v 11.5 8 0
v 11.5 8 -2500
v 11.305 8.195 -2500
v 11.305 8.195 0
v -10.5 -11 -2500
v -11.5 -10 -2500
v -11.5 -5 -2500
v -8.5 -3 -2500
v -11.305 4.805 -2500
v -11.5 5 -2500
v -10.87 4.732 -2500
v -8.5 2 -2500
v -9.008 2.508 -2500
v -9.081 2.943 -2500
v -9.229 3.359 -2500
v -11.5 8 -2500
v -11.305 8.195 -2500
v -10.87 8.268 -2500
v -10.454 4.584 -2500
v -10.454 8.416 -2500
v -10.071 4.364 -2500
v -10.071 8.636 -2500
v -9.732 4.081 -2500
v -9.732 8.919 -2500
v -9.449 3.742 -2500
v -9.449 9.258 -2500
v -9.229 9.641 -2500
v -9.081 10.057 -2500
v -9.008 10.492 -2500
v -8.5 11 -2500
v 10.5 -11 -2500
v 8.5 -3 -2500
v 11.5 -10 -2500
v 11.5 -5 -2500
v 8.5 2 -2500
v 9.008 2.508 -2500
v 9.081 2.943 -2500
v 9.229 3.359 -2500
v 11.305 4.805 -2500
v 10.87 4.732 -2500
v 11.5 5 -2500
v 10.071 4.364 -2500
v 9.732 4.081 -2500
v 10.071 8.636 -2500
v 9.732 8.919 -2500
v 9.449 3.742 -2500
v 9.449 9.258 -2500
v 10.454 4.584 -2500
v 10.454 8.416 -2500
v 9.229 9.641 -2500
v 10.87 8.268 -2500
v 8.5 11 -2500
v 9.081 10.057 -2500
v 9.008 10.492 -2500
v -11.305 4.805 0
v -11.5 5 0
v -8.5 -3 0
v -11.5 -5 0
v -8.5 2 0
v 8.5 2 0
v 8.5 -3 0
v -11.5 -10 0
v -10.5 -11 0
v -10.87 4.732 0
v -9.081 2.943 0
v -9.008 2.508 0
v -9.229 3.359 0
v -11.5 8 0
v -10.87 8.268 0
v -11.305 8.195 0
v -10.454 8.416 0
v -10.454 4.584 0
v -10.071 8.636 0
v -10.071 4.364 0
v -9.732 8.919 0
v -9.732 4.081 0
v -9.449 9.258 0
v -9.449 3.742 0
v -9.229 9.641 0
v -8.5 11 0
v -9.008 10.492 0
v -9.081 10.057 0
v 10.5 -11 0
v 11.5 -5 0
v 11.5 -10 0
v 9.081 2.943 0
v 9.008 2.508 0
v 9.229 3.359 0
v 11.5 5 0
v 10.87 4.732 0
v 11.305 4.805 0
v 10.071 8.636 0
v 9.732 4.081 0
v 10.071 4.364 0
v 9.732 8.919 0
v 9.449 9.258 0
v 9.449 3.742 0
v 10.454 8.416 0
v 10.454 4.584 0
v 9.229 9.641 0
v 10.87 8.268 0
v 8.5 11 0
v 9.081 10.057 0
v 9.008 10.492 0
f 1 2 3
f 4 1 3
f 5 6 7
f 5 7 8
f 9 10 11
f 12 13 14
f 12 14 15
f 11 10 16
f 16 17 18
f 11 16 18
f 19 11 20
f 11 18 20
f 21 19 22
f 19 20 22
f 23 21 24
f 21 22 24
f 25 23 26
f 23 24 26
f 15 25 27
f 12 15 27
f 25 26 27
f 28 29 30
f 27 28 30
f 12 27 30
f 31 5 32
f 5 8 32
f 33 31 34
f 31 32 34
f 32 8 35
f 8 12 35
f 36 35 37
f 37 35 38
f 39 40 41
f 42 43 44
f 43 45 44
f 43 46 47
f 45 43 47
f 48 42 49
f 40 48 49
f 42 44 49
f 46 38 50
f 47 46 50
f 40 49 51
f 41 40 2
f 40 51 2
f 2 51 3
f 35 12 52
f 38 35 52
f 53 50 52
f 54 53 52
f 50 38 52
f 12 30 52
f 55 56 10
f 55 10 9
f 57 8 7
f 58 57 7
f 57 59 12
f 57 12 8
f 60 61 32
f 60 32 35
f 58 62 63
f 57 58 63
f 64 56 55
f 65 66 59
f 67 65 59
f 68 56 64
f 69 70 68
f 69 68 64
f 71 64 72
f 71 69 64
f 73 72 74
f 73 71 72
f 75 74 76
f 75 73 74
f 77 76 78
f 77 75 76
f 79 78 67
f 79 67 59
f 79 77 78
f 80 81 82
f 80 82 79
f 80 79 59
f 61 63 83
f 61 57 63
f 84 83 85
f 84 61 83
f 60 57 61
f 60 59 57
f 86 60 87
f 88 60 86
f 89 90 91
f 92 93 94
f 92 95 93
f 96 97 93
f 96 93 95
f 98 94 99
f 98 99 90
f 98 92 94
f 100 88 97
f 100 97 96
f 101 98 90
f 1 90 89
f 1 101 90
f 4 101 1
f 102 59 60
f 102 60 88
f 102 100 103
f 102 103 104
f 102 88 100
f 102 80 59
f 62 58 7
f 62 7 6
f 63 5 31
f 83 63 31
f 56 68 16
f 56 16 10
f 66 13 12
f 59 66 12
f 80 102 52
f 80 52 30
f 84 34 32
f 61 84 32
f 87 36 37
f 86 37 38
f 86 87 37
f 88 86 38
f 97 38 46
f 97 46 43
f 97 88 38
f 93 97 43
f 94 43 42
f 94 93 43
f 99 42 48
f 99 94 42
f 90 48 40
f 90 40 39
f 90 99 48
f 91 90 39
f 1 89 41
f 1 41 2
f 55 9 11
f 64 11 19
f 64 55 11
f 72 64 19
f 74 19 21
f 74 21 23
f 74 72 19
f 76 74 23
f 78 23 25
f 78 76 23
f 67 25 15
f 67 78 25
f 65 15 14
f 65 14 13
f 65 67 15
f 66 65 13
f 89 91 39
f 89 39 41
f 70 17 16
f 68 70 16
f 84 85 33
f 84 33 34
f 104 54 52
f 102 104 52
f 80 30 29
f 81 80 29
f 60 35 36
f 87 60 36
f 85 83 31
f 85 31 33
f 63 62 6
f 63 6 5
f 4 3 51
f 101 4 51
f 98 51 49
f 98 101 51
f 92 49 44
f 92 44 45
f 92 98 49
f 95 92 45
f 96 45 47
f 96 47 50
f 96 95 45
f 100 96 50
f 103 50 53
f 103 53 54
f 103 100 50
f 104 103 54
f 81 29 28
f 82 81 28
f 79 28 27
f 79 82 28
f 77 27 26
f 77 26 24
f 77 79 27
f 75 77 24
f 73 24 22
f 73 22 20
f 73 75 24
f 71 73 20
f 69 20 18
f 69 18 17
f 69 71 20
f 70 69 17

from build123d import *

# Parameters (mm, degrees)
EXTRUDE_1_DEPTH = 2500


with BuildPart() as part:
    # Model → Бобышка-Вытянуть1 (new body)
    with BuildSketch(Plane.XY):
        with BuildLine():
            Line((-11.5, -10), (-10.5, -11))
            Line((-10.5, -11), (10.5, -11))
            Line((10.5, -11), (11.5, -10))
            Line((11.5, -10), (11.5, -5))
            Line((11.5, -5), (8.5, -3))
            Line((8.5, -3), (8.5, 2))
            Line((8.5, 2), (9.007584586, 2.507584586))
            ThreePointArc((9.007584586, 2.507584586), (9.732233047, 4.080761184), (11.305409645, 4.805409645))
            Line((11.305409645, 4.805409645), (11.5, 5))
            Line((11.5, 5), (11.5, 8))
            Line((11.5, 8), (11.305409645, 8.194590355))
            ThreePointArc((11.305409645, 8.194590355), (9.732233047, 8.919238816), (9.007584586, 10.492415414))
            Line((9.007584586, 10.492415414), (8.5, 11))
            Line((8.5, 11), (-8.5, 11))
            Line((-8.5, 11), (-9.007584586, 10.492415414))
            ThreePointArc((-9.007584586, 10.492415414), (-9.732233047, 8.919238816), (-11.305409645, 8.194590355))
            Line((-11.305409645, 8.194590355), (-11.5, 8))
            Line((-11.5, 8), (-11.5, 5))
            Line((-11.5, 5), (-11.305409645, 4.805409645))
            ThreePointArc((-11.305409645, 4.805409645), (-9.732233047, 4.080761184), (-9.007584586, 2.507584586))
            Line((-9.007584586, 2.507584586), (-8.5, 2))
            Line((-8.5, 2), (-8.5, -3))
            Line((-8.5, -3), (-11.5, -5))
            Line((-11.5, -5), (-11.5, -10))
        make_face()
    extrude(amount=-EXTRUDE_1_DEPTH)


solid = part.part
